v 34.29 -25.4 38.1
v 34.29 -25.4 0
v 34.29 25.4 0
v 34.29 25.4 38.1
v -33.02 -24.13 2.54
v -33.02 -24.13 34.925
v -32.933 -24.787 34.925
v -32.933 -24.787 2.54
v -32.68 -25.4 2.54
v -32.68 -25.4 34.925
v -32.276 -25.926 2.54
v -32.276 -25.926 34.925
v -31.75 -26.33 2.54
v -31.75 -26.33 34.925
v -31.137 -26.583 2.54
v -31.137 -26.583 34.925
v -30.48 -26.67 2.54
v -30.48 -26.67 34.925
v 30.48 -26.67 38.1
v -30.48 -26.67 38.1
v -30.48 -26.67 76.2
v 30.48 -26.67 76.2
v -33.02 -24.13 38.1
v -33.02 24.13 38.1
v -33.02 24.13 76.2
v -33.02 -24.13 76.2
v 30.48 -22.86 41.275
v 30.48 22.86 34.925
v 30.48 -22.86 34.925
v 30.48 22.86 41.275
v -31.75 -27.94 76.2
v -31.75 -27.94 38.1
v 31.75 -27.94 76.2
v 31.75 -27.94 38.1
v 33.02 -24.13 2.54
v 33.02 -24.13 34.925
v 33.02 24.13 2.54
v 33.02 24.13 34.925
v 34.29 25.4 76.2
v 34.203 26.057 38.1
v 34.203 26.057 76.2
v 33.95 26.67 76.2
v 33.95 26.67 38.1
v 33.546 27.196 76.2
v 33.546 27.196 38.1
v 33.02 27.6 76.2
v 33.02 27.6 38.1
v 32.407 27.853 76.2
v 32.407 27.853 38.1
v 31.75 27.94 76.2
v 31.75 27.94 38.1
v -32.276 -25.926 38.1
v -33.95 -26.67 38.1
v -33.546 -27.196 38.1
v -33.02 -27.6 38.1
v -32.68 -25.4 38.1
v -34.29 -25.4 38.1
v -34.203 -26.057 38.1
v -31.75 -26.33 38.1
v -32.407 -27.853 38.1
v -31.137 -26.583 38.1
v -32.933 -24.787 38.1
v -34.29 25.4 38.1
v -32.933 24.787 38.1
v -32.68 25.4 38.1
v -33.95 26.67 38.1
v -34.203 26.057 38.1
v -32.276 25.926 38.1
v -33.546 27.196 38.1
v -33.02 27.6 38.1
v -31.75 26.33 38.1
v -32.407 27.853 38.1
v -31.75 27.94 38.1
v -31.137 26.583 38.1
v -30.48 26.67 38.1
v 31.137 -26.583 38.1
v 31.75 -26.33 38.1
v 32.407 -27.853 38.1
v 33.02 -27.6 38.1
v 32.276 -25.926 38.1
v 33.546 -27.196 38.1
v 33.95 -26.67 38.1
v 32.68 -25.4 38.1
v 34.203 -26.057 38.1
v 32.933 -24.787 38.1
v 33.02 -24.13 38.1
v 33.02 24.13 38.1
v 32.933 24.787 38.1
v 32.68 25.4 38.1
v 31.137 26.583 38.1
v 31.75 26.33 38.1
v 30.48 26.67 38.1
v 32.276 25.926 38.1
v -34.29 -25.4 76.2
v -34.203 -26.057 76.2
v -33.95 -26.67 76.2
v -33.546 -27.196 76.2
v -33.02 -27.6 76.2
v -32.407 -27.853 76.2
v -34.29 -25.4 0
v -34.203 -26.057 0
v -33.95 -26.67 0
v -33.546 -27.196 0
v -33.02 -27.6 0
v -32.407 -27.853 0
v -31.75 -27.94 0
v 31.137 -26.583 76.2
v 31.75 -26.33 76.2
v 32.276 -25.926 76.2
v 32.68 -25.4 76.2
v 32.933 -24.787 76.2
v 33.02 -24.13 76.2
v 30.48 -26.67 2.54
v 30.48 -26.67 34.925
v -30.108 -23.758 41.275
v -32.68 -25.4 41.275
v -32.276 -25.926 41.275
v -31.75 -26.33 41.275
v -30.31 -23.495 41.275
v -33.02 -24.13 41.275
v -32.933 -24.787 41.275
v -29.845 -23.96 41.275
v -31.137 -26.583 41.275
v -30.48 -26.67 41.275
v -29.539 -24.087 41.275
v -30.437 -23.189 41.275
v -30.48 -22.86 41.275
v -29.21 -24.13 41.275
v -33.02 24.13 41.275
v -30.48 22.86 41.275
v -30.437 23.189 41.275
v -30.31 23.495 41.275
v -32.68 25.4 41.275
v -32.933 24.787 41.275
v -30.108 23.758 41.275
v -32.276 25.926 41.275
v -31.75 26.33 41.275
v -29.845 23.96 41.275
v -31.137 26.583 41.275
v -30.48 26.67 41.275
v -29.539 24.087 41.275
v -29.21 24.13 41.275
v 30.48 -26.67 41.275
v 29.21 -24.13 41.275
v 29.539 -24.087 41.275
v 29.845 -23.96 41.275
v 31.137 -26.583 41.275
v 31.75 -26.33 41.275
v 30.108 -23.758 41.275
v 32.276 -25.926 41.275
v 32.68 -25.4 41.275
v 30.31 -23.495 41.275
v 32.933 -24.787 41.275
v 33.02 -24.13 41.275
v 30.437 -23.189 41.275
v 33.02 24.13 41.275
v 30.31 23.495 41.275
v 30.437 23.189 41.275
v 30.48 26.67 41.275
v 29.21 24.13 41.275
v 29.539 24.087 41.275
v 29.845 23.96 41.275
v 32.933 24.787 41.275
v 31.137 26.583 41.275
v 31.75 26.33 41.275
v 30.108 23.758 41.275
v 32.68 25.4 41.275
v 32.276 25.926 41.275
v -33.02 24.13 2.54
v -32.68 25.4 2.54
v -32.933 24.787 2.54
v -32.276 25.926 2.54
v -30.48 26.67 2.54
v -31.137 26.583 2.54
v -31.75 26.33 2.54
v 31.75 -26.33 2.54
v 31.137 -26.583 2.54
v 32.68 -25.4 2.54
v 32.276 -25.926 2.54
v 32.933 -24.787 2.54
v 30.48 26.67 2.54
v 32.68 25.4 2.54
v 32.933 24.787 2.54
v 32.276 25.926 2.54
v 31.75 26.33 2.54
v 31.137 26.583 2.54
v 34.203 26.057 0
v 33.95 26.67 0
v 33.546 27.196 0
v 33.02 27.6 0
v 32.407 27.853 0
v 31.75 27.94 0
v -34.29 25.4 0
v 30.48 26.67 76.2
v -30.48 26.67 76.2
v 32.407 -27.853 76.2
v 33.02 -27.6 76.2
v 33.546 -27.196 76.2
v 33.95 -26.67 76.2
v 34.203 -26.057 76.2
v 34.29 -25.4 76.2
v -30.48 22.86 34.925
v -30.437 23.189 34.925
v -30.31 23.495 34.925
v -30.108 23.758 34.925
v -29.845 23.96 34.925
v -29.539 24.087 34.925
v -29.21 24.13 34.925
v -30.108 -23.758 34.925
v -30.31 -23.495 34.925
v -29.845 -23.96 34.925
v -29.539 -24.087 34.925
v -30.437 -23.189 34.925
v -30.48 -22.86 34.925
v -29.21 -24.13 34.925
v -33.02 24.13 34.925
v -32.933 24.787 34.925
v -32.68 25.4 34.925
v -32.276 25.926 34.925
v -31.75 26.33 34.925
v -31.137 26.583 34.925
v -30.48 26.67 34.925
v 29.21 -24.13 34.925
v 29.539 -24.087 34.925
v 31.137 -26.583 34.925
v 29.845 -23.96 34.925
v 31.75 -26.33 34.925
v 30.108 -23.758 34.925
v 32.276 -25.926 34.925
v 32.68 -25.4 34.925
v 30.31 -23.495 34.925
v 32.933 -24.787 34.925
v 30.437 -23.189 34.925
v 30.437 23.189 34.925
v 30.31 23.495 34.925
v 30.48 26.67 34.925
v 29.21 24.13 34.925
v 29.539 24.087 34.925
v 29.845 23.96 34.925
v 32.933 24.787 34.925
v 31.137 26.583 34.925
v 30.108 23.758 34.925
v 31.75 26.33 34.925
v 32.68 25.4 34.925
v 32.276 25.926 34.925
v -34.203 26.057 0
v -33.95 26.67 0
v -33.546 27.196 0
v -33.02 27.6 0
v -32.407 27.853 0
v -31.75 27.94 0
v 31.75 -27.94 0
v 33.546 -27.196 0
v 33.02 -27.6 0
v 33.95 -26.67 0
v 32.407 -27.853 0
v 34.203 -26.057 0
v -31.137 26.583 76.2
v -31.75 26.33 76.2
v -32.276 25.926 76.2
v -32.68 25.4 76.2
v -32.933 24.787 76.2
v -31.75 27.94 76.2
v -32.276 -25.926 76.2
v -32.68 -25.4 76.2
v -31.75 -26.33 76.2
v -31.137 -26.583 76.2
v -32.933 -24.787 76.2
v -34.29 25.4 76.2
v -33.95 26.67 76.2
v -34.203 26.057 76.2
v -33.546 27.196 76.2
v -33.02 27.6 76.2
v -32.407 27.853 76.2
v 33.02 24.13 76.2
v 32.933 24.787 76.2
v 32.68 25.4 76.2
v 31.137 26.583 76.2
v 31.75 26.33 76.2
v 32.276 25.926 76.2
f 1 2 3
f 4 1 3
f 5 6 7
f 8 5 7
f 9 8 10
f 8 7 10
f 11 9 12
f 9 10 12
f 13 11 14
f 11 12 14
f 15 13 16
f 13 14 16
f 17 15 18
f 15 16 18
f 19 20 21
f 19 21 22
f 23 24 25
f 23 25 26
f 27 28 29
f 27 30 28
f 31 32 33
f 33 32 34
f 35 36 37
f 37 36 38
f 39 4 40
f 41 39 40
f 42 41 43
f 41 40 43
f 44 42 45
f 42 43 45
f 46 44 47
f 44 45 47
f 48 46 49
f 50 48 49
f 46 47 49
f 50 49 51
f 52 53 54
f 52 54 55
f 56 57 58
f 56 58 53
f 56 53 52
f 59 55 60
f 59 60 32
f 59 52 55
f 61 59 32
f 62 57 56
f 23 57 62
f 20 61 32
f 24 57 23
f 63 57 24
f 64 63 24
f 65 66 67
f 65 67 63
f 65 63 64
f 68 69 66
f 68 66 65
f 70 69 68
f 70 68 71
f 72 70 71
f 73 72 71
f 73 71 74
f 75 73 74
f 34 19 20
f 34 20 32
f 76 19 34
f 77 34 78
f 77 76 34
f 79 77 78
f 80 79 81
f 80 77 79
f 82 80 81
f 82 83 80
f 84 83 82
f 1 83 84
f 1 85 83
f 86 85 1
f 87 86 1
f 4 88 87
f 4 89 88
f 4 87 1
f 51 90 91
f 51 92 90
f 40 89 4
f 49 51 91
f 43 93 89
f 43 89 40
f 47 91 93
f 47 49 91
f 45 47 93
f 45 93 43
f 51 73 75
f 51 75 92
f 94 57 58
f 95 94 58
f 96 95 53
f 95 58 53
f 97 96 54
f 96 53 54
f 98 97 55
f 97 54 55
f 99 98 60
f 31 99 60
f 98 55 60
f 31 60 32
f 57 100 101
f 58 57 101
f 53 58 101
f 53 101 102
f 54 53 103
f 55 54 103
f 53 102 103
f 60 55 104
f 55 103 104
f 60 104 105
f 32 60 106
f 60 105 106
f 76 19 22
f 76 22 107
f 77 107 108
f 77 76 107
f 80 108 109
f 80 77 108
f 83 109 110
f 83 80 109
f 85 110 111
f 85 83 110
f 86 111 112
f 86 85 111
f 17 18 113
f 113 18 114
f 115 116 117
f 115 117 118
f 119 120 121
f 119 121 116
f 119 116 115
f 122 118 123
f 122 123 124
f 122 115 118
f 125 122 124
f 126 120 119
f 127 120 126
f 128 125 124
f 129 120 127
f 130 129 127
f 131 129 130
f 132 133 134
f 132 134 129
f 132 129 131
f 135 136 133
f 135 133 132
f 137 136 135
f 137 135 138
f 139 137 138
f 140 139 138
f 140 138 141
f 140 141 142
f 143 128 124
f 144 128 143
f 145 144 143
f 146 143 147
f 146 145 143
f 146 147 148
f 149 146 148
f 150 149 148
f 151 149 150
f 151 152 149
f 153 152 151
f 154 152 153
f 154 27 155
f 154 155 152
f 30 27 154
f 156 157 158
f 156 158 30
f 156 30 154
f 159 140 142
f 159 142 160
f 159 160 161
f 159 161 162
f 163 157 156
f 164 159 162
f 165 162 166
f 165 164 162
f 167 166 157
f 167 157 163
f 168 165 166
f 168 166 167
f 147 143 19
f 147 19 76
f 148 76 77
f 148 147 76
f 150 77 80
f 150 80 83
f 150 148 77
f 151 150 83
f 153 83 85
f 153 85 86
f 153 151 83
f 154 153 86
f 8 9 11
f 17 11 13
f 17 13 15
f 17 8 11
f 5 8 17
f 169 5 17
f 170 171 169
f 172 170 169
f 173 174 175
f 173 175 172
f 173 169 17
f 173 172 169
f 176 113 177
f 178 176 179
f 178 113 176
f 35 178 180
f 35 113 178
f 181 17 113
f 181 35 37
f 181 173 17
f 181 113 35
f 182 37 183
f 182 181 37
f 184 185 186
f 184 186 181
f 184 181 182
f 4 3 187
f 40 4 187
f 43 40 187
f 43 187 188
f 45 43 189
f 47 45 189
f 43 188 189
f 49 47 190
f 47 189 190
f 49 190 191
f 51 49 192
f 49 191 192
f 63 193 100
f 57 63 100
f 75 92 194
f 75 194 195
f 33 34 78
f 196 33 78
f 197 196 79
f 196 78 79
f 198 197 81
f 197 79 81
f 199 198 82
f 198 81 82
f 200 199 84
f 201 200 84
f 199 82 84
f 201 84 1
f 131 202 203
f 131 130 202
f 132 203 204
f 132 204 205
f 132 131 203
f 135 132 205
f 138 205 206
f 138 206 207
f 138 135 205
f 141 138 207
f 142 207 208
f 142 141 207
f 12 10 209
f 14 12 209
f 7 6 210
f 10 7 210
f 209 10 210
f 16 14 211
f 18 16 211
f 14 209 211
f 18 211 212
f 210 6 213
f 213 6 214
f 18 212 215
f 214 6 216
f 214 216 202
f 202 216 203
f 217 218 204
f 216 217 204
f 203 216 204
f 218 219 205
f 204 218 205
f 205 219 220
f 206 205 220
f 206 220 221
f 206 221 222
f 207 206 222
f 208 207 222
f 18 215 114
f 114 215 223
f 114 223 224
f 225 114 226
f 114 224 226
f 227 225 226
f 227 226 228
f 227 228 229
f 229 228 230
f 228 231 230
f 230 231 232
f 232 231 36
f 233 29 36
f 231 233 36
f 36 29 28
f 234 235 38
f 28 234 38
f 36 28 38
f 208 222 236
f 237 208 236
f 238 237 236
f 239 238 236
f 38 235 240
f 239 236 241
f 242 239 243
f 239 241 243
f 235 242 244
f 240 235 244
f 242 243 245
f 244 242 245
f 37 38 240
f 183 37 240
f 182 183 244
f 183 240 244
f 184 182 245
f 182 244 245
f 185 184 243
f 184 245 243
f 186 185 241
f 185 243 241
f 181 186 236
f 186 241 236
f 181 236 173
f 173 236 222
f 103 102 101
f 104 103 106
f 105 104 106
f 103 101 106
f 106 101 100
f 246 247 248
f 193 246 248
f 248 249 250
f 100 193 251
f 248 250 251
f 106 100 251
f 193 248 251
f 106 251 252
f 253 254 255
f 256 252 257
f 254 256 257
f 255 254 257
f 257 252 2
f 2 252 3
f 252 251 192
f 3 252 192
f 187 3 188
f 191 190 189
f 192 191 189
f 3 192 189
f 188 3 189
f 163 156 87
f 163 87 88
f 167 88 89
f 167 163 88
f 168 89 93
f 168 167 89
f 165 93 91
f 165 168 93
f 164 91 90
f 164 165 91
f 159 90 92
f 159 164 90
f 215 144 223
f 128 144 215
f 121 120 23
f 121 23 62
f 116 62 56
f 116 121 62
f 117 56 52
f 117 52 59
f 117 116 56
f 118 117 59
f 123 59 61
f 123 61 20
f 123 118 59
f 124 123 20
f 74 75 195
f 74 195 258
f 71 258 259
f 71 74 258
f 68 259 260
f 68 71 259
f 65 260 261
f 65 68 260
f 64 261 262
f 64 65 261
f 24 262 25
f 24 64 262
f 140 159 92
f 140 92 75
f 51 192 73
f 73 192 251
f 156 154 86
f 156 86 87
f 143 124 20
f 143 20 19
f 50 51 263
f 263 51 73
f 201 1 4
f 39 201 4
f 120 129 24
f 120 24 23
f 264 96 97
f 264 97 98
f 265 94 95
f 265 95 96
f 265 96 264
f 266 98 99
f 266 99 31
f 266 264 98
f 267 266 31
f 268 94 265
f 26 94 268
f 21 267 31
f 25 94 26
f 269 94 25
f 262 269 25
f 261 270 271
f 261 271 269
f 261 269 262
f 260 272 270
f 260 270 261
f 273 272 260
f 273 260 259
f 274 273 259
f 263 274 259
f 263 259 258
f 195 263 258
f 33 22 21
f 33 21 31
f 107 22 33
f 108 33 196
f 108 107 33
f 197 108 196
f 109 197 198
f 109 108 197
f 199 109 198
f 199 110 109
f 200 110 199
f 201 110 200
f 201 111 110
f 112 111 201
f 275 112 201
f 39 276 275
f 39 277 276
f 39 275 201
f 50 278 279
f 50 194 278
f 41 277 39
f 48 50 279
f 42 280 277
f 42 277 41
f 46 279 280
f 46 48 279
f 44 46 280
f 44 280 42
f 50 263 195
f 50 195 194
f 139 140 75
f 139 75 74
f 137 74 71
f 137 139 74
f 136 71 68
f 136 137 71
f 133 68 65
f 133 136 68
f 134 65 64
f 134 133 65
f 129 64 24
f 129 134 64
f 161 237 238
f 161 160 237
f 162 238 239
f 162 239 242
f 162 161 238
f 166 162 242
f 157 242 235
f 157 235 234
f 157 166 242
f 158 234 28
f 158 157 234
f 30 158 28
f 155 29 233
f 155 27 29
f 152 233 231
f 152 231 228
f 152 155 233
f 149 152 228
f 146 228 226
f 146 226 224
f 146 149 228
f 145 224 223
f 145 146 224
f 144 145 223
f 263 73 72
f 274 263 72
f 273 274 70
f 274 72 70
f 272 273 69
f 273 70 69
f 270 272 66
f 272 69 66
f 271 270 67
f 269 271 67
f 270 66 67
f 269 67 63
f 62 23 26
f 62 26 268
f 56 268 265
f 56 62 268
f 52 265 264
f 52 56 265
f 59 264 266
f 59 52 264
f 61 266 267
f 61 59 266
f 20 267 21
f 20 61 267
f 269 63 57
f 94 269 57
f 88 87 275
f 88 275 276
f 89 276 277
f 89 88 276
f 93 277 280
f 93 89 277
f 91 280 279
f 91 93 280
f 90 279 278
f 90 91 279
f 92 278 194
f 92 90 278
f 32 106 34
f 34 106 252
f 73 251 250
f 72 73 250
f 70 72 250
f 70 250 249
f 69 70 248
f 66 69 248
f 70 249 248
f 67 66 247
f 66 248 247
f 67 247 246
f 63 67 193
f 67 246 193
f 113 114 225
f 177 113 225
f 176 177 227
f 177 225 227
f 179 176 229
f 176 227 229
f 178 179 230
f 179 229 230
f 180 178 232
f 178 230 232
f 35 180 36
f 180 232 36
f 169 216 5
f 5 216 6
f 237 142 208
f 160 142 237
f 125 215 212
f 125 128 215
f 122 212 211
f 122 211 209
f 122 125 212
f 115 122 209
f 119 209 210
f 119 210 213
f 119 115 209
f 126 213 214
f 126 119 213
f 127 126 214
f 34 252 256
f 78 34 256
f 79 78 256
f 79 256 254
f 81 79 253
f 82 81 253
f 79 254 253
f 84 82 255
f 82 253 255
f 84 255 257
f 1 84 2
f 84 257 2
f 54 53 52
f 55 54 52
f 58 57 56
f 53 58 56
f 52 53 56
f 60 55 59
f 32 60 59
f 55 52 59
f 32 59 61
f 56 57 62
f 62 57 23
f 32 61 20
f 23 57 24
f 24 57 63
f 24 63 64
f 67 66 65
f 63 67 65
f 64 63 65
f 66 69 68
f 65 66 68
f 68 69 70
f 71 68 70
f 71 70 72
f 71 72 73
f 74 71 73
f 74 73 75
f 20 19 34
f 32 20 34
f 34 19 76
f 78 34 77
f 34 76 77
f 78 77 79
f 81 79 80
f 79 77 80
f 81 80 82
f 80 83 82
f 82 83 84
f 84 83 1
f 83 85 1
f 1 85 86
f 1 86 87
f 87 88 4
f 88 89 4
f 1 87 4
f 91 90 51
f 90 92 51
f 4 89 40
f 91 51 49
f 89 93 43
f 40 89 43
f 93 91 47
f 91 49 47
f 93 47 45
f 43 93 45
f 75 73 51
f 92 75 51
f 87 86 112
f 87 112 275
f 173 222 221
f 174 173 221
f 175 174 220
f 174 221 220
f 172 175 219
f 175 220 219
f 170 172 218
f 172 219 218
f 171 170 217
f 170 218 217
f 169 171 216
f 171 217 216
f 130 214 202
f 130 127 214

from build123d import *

# Parameters (mm, degrees)
F1_DEPTH = 38.1
F3_DEPTH = 35.56
F5_DEPTH = 3.175
F6_DEPTH = 38.1


with BuildPart() as f1:
    # F0 (on Top) → F1 (new body)
    with BuildSketch(Plane.XY):
        with BuildLine():
            Line((-31.75, -27.94), (31.75, -27.94))
            ThreePointArc((31.75, -27.94), (33.5460512242, -27.1960512242), (34.29, -25.4))
            Line((34.29, -25.4), (34.29, 25.4))
            ThreePointArc((34.29, 25.4), (33.5460512242, 27.1960512242), (31.75, 27.94))
            Line((31.75, 27.94), (-31.75, 27.94))
            ThreePointArc((-31.75, 27.94), (-33.5460512242, 27.1960512242), (-34.29, 25.4))
            Line((-34.29, 25.4), (-34.29, -25.4))
            ThreePointArc((-34.29, -25.4), (-33.5460512242, -27.1960512242), (-31.75, -27.94))
        make_face()
    extrude(amount=F1_DEPTH)

    # F2 (on face) → F3 (cut)
    with BuildSketch(Plane.XY.offset(38.1)):
        with BuildLine():
            ThreePointArc((33.02, 24.13), (32.2760512242, 25.9260512242), (30.48, 26.67))
            Line((30.48, 26.67), (-30.48, 26.67))
            ThreePointArc((-30.48, 26.67), (-32.2760512242, 25.9260512242), (-33.02, 24.13))
            Line((-33.02, 24.13), (-33.02, -24.13))
            ThreePointArc((-33.02, -24.13), (-32.2760512242, -25.9260512242), (-30.48, -26.67))
            Line((-30.48, -26.67), (30.48, -26.67))
            ThreePointArc((30.48, -26.67), (32.2760512242, -25.9260512242), (33.02, -24.13))
            Line((33.02, -24.13), (33.02, 24.13))
        make_face()
    extrude(amount=-F3_DEPTH, mode=Mode.SUBTRACT)

    # F4 (on face) → F5 (join, symmetric)
    with BuildSketch(Plane.XY.offset(38.1)):
        with BuildLine():
            ThreePointArc((33.02, 24.13), (32.2760512242, 25.9260512242), (30.48, 26.67))
            Line((30.48, 26.67), (-30.48, 26.67))
            ThreePointArc((-30.48, 26.67), (-32.2760512242, 25.9260512242), (-33.02, 24.13))
            Line((-33.02, 24.13), (-33.02, -24.13))
            ThreePointArc((-33.02, -24.13), (-32.2760512242, -25.9260512242), (-30.48, -26.67))
            Line((-30.48, -26.67), (30.48, -26.67))
            ThreePointArc((30.48, -26.67), (32.2760512242, -25.9260512242), (33.02, -24.13))
            Line((33.02, -24.13), (33.02, 24.13))
        make_face()
        with BuildLine():
            Line((-29.21, 24.13), (29.21, 24.13))
            ThreePointArc((29.21, 24.13), (30.1080256121, 23.7580256121), (30.48, 22.86))
            Line((30.48, 22.86), (30.48, -22.86))
            ThreePointArc((30.48, -22.86), (30.1080256121, -23.7580256121), (29.21, -24.13))
            Line((29.21, -24.13), (-29.21, -24.13))
            ThreePointArc((-29.21, -24.13), (-30.1080256121, -23.7580256121), (-30.48, -22.86))
            Line((-30.48, -22.86), (-30.48, 22.86))
            ThreePointArc((-30.48, 22.86), (-30.1080256121, 23.7580256121), (-29.21, 24.13))
        make_face(mode=Mode.SUBTRACT)
    extrude(amount=F5_DEPTH, both=True)


with BuildPart() as f6:
    # F6 (new): a face of the model
    f6_faces = [f1.part.faces().sort_by_distance(p)[0] for p in [
        (0, -27.0553650018, 38.1),
    ]]
    extrude(f6_faces, amount=F6_DEPTH)


solid = Compound([f1.part, f6.part])
